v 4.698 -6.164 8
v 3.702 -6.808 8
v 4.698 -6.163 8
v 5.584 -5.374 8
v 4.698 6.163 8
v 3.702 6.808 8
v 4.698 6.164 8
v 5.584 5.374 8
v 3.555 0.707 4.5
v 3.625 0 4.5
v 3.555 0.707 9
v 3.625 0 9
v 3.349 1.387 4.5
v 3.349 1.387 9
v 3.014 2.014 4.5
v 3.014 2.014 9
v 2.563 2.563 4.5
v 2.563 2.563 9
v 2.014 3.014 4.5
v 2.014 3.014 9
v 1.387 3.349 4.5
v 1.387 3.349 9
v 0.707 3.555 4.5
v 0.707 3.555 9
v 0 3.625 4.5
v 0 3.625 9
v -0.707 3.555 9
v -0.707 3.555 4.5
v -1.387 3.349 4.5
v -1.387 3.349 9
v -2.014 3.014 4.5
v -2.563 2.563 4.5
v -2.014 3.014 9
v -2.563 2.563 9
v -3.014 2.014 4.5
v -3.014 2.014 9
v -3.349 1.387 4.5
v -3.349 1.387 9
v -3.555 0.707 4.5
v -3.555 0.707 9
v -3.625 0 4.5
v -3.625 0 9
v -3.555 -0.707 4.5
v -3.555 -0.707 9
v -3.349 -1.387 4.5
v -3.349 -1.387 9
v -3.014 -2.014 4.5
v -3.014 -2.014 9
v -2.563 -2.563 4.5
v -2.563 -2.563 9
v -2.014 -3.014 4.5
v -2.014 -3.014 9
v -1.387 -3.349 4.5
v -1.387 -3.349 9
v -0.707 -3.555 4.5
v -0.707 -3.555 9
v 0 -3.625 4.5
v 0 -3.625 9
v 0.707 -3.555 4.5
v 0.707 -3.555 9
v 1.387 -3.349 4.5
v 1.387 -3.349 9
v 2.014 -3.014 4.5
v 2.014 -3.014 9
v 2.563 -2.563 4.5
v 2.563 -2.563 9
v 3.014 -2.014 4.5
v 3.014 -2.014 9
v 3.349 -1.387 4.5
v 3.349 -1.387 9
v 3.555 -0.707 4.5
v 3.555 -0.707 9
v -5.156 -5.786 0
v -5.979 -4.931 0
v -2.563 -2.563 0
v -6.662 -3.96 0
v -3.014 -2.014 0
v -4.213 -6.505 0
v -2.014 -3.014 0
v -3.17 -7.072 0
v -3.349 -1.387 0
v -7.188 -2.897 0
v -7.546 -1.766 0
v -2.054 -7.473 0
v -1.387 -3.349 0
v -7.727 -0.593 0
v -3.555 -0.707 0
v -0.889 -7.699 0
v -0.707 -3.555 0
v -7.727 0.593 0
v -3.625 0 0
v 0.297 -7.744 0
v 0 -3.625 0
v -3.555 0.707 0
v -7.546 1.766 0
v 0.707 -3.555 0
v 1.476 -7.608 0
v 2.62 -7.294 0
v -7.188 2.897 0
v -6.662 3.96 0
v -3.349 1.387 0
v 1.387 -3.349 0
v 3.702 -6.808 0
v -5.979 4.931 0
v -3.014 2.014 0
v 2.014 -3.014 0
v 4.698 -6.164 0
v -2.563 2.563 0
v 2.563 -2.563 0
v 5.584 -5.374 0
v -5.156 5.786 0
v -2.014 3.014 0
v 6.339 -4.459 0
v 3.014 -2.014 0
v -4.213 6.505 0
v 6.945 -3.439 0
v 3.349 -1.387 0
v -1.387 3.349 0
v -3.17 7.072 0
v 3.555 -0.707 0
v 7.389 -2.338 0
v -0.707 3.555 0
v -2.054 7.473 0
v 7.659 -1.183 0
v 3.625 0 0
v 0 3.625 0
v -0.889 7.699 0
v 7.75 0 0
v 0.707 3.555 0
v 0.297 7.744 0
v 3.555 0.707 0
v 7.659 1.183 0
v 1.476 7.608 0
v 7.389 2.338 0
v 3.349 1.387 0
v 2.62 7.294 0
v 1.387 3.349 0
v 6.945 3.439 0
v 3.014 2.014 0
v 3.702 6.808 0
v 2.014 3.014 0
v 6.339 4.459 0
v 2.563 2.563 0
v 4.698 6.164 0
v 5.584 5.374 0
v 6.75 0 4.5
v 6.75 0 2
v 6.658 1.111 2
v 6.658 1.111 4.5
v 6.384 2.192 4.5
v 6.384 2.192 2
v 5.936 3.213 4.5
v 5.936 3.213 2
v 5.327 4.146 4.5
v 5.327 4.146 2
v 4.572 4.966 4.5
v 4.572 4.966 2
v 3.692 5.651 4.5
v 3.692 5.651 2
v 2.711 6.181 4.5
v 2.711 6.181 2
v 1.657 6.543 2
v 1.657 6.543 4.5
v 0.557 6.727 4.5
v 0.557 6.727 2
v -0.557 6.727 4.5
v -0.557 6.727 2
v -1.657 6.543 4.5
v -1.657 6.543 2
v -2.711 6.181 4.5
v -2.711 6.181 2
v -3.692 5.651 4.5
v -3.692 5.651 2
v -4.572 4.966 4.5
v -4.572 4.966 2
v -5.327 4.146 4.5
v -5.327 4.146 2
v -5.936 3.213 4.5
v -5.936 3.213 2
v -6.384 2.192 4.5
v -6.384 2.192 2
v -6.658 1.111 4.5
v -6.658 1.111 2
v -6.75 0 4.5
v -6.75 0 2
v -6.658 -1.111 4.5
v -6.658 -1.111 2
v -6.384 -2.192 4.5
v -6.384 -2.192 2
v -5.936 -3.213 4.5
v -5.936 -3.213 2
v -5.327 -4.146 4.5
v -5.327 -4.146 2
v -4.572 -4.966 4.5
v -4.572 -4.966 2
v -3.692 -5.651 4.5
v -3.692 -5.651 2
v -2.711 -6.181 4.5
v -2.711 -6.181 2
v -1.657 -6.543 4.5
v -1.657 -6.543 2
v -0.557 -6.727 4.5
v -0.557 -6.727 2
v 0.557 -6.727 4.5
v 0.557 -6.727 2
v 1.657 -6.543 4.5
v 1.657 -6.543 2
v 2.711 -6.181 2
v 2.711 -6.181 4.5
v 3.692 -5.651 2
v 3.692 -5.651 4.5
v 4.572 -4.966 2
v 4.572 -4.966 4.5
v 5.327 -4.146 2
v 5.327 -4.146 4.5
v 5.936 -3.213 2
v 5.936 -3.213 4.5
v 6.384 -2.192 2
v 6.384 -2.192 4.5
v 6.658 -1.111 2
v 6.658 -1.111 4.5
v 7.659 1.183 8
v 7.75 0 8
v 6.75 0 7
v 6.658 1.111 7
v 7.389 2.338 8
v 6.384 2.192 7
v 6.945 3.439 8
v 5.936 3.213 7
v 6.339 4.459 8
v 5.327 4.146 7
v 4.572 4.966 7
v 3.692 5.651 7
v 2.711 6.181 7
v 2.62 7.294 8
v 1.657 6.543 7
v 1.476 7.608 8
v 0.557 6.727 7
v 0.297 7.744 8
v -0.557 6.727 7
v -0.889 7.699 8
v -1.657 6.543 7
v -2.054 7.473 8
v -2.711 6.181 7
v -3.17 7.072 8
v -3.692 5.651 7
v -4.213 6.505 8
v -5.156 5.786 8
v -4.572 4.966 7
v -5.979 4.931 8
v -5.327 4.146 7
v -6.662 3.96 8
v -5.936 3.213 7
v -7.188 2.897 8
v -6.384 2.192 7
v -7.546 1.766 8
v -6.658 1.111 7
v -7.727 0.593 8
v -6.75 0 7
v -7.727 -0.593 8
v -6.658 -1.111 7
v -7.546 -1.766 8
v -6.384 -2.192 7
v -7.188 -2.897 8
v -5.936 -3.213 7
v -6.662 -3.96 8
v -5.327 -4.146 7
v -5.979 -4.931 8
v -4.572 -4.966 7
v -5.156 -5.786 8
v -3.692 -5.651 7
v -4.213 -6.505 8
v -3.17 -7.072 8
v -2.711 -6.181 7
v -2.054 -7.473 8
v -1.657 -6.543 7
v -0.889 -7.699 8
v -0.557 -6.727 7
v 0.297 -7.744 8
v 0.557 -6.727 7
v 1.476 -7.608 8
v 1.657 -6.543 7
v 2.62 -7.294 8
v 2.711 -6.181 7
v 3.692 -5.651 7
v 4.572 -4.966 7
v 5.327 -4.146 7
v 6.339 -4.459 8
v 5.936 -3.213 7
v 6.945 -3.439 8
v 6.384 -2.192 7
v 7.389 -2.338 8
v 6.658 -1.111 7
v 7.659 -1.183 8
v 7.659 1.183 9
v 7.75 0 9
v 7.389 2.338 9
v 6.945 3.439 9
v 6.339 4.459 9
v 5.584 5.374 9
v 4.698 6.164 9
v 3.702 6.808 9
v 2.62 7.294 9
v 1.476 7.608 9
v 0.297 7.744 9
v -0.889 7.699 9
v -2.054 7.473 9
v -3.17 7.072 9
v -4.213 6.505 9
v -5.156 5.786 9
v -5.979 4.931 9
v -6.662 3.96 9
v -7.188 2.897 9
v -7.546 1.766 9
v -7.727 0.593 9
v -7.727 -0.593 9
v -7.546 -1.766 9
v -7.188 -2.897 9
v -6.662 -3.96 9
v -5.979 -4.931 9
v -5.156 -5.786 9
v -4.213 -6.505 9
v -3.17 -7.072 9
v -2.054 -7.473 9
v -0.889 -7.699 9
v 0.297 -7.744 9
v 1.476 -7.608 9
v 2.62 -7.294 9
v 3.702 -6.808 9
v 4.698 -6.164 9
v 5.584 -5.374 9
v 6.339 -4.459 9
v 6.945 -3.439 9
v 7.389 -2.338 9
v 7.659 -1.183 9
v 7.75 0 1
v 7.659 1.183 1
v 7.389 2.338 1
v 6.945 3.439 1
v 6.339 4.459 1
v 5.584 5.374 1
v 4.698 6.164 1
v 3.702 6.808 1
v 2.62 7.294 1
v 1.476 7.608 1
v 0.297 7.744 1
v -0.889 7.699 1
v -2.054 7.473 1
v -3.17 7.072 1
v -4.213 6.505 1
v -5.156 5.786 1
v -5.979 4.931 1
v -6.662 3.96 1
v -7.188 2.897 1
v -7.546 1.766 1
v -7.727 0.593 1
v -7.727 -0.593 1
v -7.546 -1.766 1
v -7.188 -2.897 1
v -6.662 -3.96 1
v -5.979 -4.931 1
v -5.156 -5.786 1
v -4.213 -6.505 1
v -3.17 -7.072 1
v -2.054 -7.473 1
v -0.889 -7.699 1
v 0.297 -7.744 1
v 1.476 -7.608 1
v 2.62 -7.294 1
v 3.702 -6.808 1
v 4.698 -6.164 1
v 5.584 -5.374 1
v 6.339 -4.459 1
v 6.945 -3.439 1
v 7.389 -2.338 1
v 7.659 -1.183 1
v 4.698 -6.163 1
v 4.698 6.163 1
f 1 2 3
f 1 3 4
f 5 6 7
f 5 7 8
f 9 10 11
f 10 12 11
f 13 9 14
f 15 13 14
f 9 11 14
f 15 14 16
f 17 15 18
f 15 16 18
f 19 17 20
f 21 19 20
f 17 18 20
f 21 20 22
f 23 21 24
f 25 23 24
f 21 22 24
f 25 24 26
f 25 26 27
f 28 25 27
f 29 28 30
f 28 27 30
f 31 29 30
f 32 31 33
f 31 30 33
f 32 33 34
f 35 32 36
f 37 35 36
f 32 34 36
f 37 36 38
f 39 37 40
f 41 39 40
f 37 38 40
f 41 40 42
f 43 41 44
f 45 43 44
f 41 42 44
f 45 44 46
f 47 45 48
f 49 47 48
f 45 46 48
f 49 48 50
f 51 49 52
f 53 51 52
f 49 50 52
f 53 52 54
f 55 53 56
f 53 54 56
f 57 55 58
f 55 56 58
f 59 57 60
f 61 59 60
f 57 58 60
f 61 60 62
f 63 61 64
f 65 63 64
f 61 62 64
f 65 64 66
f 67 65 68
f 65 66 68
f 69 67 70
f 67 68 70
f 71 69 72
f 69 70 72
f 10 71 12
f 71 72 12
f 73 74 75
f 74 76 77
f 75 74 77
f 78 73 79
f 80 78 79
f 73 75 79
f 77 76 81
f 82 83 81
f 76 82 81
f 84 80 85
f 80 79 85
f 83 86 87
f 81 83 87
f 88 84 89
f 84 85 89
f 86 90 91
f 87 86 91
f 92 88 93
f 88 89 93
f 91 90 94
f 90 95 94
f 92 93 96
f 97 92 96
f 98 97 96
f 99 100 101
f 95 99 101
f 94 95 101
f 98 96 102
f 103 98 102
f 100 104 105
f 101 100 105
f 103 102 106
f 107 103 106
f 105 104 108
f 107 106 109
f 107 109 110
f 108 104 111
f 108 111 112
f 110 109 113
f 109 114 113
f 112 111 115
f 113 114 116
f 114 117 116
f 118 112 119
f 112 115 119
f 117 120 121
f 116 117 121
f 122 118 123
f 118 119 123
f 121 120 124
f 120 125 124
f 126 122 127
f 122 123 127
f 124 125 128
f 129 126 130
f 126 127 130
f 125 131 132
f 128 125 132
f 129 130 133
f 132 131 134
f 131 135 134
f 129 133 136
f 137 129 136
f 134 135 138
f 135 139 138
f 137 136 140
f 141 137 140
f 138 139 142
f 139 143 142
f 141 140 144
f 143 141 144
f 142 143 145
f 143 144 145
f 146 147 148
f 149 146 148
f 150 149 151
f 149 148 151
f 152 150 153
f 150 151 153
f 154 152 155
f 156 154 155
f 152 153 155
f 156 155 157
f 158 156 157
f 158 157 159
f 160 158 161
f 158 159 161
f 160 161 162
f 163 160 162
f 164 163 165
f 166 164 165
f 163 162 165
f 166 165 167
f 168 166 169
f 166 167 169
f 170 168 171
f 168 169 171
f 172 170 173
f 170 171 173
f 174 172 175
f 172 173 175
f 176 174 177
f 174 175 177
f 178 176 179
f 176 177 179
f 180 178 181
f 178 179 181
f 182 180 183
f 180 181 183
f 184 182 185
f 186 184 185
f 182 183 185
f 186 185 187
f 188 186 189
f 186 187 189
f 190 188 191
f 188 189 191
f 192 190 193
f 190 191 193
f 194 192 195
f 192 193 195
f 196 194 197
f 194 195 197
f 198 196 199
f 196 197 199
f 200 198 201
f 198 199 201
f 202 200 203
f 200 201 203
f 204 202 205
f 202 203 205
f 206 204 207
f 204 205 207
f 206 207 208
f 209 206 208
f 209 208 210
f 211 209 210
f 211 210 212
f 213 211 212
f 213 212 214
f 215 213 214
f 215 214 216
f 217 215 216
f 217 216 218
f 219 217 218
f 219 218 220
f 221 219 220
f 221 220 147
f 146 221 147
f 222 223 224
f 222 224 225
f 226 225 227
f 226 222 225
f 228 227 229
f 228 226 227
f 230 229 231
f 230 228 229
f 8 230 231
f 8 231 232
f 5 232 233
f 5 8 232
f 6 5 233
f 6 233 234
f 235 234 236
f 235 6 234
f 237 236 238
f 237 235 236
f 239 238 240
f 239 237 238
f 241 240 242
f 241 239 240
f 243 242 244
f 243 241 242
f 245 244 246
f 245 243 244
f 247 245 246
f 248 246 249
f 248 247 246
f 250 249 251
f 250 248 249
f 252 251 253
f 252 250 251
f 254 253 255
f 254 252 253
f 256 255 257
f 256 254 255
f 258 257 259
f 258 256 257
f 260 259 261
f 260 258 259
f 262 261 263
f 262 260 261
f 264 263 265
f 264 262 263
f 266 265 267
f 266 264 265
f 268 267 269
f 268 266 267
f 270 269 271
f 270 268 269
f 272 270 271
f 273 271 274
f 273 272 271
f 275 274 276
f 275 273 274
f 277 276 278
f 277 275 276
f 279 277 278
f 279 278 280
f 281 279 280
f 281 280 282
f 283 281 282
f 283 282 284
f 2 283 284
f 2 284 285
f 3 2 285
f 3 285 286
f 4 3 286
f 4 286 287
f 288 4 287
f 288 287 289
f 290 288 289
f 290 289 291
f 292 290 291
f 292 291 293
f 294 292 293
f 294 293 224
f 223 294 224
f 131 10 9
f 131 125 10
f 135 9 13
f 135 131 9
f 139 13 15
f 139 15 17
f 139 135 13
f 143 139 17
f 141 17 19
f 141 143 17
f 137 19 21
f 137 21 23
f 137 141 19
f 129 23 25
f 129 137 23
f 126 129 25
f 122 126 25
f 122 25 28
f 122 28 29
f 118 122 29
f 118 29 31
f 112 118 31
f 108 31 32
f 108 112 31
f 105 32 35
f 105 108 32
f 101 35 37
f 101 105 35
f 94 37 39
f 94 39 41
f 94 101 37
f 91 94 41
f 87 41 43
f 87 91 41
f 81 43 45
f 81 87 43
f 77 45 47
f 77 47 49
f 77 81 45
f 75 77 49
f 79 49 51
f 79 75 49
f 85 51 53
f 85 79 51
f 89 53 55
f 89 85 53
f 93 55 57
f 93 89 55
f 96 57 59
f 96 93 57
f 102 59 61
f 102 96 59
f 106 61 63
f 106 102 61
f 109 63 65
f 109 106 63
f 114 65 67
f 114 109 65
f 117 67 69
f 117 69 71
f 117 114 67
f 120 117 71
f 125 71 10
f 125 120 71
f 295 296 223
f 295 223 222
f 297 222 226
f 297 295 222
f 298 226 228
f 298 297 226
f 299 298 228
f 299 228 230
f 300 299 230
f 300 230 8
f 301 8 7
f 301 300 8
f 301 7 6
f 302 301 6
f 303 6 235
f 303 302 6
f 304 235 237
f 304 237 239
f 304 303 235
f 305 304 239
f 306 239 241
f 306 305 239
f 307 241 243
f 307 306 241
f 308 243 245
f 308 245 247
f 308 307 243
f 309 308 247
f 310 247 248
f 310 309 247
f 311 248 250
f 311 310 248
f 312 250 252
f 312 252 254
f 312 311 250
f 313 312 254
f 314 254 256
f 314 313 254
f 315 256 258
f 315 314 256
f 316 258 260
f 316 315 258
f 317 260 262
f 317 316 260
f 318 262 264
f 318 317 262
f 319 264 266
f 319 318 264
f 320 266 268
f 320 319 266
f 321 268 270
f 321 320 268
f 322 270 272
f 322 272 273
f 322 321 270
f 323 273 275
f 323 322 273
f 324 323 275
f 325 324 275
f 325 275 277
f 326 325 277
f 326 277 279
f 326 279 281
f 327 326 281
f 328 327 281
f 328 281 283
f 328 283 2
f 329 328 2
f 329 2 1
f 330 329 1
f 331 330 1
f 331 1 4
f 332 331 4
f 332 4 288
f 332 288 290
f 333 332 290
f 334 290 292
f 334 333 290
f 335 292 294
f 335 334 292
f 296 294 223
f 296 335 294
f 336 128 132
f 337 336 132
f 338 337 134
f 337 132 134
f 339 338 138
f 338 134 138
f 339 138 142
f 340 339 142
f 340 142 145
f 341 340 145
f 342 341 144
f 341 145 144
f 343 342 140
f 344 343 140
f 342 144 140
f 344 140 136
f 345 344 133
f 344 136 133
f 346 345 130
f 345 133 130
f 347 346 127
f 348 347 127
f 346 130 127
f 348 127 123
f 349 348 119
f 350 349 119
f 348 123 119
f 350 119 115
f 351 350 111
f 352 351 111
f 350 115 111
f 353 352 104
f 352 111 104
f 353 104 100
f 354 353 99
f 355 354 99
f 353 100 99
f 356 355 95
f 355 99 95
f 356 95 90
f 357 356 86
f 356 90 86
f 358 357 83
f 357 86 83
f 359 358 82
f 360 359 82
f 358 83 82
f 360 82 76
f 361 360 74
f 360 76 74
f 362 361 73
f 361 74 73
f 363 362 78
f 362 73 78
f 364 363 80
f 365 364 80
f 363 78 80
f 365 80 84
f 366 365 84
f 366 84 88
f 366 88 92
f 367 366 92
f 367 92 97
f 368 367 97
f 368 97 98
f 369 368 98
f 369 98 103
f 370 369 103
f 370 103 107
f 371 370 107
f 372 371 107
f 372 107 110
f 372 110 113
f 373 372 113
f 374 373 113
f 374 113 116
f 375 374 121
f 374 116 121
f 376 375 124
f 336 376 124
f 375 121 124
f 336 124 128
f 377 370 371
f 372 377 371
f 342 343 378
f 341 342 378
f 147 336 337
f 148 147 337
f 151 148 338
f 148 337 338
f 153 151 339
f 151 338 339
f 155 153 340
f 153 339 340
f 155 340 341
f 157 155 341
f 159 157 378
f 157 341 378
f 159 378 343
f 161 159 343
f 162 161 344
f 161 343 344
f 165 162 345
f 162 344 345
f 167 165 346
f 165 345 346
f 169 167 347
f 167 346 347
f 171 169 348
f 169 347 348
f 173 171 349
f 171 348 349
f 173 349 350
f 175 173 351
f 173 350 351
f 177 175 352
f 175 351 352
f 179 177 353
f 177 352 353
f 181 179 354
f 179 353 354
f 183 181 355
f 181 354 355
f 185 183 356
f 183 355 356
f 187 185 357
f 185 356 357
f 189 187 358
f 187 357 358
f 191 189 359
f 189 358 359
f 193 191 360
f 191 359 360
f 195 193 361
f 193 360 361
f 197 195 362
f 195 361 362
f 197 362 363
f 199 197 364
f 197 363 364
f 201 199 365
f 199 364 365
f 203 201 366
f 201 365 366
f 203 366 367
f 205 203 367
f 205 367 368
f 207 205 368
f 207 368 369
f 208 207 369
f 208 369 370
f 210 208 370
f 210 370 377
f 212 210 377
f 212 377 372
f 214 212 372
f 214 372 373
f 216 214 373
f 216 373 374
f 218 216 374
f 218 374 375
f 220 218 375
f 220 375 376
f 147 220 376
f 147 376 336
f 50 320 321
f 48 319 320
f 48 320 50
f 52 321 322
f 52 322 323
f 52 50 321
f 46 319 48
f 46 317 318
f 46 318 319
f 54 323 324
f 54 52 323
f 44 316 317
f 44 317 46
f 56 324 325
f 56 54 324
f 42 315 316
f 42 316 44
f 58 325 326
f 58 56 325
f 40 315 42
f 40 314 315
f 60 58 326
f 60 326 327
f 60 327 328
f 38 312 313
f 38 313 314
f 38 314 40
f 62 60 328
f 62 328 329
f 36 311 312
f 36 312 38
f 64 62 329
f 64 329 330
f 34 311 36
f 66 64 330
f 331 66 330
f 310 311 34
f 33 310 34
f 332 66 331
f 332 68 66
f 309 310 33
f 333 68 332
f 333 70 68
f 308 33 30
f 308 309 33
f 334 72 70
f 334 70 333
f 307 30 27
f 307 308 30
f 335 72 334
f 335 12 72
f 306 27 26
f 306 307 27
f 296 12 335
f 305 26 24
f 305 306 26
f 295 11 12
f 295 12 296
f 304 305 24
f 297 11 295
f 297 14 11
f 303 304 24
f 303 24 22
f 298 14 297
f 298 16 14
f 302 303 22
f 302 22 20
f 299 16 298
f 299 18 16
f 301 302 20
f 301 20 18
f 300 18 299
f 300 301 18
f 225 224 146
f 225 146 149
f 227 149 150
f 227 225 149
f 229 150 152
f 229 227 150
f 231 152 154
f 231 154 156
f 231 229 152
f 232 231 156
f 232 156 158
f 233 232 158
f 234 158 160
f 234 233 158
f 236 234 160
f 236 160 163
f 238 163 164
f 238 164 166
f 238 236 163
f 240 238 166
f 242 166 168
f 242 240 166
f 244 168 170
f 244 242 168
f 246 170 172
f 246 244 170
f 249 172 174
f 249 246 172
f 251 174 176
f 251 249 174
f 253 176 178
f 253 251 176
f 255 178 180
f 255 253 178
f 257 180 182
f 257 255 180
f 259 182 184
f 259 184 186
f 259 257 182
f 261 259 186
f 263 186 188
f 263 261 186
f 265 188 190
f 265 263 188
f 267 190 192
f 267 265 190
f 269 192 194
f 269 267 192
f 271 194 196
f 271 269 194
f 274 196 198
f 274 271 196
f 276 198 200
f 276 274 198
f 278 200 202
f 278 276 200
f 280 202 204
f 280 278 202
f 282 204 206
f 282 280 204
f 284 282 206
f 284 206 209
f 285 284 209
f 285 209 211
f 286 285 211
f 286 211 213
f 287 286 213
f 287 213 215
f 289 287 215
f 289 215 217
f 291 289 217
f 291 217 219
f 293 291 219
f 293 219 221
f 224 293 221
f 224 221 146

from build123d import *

# Parameters (mm, degrees)
SKETCH1_R           = 7.75
SKETCH1_R_2         = 3.625
BOSS_EXTRUDE1_DEPTH = 1
SKETCH2_R           = 6.75
SKETCH2_R_2         = 3.625
BOSS_EXTRUDE2_DEPTH = 3.5
CHAMFER1_SIZE       = 1


with BuildPart() as part:
    # Sketch1 → Boss-Extrude1 (new body)
    with BuildSketch(Plane.XY):
        Circle(SKETCH1_R)
        Circle(SKETCH1_R_2, mode=Mode.SUBTRACT)
    extrude(amount=BOSS_EXTRUDE1_DEPTH)

    # Sketch2 → Boss-Extrude2 (add)
    with BuildSketch(Plane.XY.offset(1)):
        Circle(SKETCH2_R)
        Circle(SKETCH2_R_2, mode=Mode.SUBTRACT)
    extrude(amount=BOSS_EXTRUDE2_DEPTH)

    # Chamfer1
    chamfer1_edges = [part.edges().sort_by_distance(p)[0] for p in [
        (-6.75, 0, 1),
    ]]
    chamfer(chamfer1_edges, length=CHAMFER1_SIZE - 0.0001)  # a hair under: the kernel refuses the full size

    # Mirror5: part across plane


with BuildPart() as part_1:
    add(part.part)
    add(part.part.mirror(Plane.XY.offset(4.5)))


solid = part_1.part
